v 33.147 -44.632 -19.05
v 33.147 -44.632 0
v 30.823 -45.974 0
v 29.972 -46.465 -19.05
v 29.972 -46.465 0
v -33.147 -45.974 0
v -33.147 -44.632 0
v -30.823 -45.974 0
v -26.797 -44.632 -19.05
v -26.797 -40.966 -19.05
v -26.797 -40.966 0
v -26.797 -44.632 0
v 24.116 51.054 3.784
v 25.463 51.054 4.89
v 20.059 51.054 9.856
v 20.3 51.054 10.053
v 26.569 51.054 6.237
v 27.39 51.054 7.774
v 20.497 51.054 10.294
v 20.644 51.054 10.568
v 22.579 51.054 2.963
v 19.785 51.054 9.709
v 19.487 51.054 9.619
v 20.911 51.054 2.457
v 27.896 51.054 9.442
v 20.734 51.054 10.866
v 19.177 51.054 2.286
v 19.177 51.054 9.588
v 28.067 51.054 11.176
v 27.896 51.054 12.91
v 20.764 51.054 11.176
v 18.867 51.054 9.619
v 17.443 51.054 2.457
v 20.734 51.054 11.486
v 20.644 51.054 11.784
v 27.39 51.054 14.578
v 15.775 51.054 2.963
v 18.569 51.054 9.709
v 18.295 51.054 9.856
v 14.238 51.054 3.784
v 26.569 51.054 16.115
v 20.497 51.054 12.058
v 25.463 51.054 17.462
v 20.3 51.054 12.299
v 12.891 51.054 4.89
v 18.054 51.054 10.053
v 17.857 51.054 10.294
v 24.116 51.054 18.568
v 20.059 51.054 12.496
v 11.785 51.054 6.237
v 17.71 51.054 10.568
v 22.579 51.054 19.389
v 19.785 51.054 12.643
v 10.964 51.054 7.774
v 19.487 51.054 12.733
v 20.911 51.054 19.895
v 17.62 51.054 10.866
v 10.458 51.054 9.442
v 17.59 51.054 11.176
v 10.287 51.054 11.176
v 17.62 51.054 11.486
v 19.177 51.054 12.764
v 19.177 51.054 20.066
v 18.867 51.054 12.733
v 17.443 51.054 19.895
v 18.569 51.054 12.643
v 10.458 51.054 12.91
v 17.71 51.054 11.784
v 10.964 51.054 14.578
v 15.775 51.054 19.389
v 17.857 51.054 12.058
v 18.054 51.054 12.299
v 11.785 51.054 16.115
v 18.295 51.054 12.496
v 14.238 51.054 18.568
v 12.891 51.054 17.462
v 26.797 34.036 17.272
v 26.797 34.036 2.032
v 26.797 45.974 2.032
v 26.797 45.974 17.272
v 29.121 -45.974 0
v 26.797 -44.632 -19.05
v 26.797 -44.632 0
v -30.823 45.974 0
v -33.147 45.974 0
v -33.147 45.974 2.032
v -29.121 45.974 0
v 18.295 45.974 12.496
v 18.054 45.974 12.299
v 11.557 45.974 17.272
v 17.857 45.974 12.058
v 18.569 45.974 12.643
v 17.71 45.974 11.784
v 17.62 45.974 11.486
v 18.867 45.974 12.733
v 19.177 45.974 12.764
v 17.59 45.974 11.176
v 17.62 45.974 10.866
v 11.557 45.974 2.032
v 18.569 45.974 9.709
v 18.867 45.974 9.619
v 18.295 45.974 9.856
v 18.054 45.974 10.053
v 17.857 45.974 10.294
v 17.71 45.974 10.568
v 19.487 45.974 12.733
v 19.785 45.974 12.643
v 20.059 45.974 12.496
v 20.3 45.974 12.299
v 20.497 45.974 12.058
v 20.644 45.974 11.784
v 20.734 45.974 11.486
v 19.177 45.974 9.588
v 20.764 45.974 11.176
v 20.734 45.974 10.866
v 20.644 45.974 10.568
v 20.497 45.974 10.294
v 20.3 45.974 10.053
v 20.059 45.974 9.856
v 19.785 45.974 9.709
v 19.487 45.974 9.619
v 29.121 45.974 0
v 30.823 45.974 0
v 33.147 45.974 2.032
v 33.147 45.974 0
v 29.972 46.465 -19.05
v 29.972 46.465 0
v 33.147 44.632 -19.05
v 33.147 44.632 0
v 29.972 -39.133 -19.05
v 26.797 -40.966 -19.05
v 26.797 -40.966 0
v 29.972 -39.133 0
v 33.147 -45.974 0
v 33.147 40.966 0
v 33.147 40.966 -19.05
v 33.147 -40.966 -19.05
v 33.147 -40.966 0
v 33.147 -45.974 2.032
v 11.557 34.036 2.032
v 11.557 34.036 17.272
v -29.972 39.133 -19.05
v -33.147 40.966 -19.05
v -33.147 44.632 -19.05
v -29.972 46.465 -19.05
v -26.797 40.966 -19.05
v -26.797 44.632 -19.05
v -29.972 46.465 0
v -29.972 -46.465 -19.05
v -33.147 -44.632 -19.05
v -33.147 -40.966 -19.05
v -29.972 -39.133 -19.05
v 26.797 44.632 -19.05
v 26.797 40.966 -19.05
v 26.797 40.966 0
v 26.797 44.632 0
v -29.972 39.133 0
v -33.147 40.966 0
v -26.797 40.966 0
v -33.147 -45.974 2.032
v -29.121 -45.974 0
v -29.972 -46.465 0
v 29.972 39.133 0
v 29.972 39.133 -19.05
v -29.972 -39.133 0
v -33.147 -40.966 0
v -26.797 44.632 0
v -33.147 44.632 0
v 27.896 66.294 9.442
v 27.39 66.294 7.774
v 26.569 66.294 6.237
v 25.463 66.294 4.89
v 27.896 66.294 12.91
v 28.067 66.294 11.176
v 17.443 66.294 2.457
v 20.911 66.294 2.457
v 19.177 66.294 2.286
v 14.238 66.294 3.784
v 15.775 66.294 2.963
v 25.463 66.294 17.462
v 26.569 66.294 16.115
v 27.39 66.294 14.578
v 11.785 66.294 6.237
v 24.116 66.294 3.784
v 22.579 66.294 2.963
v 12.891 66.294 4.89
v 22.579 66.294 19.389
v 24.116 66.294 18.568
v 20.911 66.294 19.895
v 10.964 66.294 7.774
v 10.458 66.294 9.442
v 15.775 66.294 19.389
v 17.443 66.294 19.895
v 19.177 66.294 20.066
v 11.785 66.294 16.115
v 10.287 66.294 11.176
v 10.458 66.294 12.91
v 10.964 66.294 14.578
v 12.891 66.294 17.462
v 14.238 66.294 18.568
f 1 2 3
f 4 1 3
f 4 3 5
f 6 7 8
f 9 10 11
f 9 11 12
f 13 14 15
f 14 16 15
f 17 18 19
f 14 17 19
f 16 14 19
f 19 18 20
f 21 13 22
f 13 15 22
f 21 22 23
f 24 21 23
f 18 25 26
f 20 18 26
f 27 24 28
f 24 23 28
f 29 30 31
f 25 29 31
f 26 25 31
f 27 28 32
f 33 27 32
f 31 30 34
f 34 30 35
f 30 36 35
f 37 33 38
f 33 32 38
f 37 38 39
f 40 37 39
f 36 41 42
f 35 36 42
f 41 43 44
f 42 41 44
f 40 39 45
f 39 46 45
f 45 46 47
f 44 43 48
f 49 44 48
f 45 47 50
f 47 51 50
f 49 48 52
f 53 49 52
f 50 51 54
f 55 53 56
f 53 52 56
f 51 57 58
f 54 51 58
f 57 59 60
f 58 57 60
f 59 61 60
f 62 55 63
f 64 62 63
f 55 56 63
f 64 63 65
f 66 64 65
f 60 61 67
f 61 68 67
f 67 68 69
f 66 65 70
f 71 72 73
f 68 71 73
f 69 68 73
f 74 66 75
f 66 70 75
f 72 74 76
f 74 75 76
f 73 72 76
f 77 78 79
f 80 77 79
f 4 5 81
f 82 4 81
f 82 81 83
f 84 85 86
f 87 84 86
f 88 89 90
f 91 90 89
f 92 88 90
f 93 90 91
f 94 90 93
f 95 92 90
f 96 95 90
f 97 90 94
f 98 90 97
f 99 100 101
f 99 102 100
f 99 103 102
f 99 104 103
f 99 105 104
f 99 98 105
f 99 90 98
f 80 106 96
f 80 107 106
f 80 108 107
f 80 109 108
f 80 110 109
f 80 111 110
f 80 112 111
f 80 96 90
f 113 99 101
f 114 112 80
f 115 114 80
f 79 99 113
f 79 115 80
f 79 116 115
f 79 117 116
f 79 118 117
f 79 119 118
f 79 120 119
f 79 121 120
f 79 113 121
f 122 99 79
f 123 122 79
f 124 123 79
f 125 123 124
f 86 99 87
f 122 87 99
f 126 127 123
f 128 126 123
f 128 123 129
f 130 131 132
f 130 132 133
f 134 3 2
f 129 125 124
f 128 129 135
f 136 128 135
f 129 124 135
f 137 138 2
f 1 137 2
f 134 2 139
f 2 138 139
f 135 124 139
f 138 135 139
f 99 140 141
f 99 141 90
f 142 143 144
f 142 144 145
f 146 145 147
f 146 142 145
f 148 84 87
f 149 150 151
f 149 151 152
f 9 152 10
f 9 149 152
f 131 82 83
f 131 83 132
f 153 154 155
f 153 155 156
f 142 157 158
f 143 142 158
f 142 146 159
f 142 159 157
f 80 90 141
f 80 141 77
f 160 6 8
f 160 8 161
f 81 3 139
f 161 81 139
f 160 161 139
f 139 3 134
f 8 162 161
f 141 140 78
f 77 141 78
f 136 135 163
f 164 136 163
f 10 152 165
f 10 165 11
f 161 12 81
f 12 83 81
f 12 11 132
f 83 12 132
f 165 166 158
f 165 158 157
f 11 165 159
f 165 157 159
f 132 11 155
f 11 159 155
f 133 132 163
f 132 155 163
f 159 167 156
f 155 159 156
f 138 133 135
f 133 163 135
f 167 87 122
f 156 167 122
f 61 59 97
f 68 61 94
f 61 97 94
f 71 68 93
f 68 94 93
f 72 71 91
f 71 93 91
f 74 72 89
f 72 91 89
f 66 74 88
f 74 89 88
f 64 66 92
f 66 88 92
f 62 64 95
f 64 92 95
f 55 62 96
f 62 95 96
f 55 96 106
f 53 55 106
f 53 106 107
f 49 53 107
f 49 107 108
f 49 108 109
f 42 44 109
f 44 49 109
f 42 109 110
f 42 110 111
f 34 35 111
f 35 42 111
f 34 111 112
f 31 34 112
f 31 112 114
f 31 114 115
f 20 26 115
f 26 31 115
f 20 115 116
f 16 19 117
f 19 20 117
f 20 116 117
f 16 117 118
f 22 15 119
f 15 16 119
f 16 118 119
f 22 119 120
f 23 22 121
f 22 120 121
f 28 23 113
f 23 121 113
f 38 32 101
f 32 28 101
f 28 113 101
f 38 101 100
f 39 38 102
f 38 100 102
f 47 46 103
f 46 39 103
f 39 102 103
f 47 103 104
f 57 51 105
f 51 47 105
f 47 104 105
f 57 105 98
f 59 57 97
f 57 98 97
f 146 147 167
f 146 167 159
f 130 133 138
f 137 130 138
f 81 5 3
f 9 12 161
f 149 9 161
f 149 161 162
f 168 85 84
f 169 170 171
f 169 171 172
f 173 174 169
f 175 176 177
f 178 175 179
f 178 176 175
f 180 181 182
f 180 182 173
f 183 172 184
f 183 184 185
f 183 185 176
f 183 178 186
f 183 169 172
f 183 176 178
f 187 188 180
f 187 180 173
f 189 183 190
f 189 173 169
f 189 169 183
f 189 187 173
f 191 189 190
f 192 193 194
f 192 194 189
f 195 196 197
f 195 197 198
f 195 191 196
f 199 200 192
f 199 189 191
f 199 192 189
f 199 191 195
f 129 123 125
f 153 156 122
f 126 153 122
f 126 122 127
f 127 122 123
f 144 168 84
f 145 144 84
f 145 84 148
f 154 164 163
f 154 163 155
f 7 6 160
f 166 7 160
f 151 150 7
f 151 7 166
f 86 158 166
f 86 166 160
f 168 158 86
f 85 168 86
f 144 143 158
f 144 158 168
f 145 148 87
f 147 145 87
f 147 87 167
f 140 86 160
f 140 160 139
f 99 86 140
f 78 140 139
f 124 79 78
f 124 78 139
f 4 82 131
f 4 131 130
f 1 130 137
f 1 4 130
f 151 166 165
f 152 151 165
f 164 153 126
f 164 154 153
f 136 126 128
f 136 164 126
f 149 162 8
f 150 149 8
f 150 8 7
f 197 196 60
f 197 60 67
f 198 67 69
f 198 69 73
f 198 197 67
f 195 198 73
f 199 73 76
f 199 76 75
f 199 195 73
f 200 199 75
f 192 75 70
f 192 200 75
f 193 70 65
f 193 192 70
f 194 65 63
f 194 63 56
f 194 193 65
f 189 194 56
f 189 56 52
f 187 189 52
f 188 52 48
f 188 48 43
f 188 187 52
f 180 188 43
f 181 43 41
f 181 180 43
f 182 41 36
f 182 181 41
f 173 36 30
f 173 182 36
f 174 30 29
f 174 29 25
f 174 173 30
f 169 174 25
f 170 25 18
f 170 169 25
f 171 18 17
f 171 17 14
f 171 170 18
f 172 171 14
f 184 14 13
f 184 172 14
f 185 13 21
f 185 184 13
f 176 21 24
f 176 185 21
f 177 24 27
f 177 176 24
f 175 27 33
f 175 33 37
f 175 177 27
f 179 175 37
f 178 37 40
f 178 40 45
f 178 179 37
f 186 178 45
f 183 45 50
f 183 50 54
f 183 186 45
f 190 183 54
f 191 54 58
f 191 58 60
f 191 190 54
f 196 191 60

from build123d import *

# Parameters (mm, degrees)
F0_W     = 66.294
F0_H     = 91.948
F1_DEPTH = 2.032
F2_W     = 15.24
F2_H     = 11.938
F3_DEPTH = 15.24
F4_R     = 1.5875
F5_DEPTH = 20.32
F6_R     = 8.89
F7_DEPTH = 15.24
F9_DEPTH = 19.05


with BuildPart() as f1:
    # F0 (on Top) → F1 (new body)
    with BuildSketch(Plane.XY):
        Rectangle(F0_W, F0_H)
    extrude(amount=F1_DEPTH)

    # F2 (on face) → F3 (join)
    with BuildSketch(Plane.XY.offset(2.032)):
        with Locations((19.177, 40.005)):
            Rectangle(F2_W, F2_H)
    extrude(amount=F3_DEPTH)

    # F4 (on face) → F5 (join)
    with BuildSketch(Plane(origin=(0, 45.974, 0), x_dir=(-1, 0, 0), z_dir=(0, 1, 0))):
        with Locations((-19.177, 11.176)):
            Circle(F4_R)
    extrude(amount=F5_DEPTH)

    # F6 (on face) → F7 (join)
    with BuildSketch(Plane(origin=(0, 66.294, 0), x_dir=(-1, 0, 0), z_dir=(0, 1, 0))):
        with Locations((-19.177, 11.176)):
            Circle(F6_R)
    extrude(amount=-F7_DEPTH)

    # F8 (on face) → F9 (join)
    with BuildSketch(Plane(origin=(0, 0, 0), x_dir=(1, 0, 0), z_dir=(0, 0, -1))):
        Polygon((33.147, 40.965913), (33.147, 44.632087), (29.972, 46.465174), (26.797, 44.632087), (26.797, 40.965913), (29.972, 39.132826), align=None)
        Polygon((-29.972, 46.465174), (-33.147, 44.632087), (-33.147, 40.965913), (-29.972, 39.132826), (-26.797, 40.965913), (-26.797, 44.632087), align=None)
        Polygon((26.797, -44.632087), (29.972, -46.465174), (33.147, -44.632087), (33.147, -40.965913), (29.972, -39.132826), (26.797, -40.965913), align=None)
        Polygon((-33.147, -40.965913), (-33.147, -44.632087), (-29.972, -46.465174), (-26.797, -44.632087), (-26.797, -40.965913), (-29.972, -39.132826), align=None)
    extrude(amount=F9_DEPTH)


solid = f1.part
